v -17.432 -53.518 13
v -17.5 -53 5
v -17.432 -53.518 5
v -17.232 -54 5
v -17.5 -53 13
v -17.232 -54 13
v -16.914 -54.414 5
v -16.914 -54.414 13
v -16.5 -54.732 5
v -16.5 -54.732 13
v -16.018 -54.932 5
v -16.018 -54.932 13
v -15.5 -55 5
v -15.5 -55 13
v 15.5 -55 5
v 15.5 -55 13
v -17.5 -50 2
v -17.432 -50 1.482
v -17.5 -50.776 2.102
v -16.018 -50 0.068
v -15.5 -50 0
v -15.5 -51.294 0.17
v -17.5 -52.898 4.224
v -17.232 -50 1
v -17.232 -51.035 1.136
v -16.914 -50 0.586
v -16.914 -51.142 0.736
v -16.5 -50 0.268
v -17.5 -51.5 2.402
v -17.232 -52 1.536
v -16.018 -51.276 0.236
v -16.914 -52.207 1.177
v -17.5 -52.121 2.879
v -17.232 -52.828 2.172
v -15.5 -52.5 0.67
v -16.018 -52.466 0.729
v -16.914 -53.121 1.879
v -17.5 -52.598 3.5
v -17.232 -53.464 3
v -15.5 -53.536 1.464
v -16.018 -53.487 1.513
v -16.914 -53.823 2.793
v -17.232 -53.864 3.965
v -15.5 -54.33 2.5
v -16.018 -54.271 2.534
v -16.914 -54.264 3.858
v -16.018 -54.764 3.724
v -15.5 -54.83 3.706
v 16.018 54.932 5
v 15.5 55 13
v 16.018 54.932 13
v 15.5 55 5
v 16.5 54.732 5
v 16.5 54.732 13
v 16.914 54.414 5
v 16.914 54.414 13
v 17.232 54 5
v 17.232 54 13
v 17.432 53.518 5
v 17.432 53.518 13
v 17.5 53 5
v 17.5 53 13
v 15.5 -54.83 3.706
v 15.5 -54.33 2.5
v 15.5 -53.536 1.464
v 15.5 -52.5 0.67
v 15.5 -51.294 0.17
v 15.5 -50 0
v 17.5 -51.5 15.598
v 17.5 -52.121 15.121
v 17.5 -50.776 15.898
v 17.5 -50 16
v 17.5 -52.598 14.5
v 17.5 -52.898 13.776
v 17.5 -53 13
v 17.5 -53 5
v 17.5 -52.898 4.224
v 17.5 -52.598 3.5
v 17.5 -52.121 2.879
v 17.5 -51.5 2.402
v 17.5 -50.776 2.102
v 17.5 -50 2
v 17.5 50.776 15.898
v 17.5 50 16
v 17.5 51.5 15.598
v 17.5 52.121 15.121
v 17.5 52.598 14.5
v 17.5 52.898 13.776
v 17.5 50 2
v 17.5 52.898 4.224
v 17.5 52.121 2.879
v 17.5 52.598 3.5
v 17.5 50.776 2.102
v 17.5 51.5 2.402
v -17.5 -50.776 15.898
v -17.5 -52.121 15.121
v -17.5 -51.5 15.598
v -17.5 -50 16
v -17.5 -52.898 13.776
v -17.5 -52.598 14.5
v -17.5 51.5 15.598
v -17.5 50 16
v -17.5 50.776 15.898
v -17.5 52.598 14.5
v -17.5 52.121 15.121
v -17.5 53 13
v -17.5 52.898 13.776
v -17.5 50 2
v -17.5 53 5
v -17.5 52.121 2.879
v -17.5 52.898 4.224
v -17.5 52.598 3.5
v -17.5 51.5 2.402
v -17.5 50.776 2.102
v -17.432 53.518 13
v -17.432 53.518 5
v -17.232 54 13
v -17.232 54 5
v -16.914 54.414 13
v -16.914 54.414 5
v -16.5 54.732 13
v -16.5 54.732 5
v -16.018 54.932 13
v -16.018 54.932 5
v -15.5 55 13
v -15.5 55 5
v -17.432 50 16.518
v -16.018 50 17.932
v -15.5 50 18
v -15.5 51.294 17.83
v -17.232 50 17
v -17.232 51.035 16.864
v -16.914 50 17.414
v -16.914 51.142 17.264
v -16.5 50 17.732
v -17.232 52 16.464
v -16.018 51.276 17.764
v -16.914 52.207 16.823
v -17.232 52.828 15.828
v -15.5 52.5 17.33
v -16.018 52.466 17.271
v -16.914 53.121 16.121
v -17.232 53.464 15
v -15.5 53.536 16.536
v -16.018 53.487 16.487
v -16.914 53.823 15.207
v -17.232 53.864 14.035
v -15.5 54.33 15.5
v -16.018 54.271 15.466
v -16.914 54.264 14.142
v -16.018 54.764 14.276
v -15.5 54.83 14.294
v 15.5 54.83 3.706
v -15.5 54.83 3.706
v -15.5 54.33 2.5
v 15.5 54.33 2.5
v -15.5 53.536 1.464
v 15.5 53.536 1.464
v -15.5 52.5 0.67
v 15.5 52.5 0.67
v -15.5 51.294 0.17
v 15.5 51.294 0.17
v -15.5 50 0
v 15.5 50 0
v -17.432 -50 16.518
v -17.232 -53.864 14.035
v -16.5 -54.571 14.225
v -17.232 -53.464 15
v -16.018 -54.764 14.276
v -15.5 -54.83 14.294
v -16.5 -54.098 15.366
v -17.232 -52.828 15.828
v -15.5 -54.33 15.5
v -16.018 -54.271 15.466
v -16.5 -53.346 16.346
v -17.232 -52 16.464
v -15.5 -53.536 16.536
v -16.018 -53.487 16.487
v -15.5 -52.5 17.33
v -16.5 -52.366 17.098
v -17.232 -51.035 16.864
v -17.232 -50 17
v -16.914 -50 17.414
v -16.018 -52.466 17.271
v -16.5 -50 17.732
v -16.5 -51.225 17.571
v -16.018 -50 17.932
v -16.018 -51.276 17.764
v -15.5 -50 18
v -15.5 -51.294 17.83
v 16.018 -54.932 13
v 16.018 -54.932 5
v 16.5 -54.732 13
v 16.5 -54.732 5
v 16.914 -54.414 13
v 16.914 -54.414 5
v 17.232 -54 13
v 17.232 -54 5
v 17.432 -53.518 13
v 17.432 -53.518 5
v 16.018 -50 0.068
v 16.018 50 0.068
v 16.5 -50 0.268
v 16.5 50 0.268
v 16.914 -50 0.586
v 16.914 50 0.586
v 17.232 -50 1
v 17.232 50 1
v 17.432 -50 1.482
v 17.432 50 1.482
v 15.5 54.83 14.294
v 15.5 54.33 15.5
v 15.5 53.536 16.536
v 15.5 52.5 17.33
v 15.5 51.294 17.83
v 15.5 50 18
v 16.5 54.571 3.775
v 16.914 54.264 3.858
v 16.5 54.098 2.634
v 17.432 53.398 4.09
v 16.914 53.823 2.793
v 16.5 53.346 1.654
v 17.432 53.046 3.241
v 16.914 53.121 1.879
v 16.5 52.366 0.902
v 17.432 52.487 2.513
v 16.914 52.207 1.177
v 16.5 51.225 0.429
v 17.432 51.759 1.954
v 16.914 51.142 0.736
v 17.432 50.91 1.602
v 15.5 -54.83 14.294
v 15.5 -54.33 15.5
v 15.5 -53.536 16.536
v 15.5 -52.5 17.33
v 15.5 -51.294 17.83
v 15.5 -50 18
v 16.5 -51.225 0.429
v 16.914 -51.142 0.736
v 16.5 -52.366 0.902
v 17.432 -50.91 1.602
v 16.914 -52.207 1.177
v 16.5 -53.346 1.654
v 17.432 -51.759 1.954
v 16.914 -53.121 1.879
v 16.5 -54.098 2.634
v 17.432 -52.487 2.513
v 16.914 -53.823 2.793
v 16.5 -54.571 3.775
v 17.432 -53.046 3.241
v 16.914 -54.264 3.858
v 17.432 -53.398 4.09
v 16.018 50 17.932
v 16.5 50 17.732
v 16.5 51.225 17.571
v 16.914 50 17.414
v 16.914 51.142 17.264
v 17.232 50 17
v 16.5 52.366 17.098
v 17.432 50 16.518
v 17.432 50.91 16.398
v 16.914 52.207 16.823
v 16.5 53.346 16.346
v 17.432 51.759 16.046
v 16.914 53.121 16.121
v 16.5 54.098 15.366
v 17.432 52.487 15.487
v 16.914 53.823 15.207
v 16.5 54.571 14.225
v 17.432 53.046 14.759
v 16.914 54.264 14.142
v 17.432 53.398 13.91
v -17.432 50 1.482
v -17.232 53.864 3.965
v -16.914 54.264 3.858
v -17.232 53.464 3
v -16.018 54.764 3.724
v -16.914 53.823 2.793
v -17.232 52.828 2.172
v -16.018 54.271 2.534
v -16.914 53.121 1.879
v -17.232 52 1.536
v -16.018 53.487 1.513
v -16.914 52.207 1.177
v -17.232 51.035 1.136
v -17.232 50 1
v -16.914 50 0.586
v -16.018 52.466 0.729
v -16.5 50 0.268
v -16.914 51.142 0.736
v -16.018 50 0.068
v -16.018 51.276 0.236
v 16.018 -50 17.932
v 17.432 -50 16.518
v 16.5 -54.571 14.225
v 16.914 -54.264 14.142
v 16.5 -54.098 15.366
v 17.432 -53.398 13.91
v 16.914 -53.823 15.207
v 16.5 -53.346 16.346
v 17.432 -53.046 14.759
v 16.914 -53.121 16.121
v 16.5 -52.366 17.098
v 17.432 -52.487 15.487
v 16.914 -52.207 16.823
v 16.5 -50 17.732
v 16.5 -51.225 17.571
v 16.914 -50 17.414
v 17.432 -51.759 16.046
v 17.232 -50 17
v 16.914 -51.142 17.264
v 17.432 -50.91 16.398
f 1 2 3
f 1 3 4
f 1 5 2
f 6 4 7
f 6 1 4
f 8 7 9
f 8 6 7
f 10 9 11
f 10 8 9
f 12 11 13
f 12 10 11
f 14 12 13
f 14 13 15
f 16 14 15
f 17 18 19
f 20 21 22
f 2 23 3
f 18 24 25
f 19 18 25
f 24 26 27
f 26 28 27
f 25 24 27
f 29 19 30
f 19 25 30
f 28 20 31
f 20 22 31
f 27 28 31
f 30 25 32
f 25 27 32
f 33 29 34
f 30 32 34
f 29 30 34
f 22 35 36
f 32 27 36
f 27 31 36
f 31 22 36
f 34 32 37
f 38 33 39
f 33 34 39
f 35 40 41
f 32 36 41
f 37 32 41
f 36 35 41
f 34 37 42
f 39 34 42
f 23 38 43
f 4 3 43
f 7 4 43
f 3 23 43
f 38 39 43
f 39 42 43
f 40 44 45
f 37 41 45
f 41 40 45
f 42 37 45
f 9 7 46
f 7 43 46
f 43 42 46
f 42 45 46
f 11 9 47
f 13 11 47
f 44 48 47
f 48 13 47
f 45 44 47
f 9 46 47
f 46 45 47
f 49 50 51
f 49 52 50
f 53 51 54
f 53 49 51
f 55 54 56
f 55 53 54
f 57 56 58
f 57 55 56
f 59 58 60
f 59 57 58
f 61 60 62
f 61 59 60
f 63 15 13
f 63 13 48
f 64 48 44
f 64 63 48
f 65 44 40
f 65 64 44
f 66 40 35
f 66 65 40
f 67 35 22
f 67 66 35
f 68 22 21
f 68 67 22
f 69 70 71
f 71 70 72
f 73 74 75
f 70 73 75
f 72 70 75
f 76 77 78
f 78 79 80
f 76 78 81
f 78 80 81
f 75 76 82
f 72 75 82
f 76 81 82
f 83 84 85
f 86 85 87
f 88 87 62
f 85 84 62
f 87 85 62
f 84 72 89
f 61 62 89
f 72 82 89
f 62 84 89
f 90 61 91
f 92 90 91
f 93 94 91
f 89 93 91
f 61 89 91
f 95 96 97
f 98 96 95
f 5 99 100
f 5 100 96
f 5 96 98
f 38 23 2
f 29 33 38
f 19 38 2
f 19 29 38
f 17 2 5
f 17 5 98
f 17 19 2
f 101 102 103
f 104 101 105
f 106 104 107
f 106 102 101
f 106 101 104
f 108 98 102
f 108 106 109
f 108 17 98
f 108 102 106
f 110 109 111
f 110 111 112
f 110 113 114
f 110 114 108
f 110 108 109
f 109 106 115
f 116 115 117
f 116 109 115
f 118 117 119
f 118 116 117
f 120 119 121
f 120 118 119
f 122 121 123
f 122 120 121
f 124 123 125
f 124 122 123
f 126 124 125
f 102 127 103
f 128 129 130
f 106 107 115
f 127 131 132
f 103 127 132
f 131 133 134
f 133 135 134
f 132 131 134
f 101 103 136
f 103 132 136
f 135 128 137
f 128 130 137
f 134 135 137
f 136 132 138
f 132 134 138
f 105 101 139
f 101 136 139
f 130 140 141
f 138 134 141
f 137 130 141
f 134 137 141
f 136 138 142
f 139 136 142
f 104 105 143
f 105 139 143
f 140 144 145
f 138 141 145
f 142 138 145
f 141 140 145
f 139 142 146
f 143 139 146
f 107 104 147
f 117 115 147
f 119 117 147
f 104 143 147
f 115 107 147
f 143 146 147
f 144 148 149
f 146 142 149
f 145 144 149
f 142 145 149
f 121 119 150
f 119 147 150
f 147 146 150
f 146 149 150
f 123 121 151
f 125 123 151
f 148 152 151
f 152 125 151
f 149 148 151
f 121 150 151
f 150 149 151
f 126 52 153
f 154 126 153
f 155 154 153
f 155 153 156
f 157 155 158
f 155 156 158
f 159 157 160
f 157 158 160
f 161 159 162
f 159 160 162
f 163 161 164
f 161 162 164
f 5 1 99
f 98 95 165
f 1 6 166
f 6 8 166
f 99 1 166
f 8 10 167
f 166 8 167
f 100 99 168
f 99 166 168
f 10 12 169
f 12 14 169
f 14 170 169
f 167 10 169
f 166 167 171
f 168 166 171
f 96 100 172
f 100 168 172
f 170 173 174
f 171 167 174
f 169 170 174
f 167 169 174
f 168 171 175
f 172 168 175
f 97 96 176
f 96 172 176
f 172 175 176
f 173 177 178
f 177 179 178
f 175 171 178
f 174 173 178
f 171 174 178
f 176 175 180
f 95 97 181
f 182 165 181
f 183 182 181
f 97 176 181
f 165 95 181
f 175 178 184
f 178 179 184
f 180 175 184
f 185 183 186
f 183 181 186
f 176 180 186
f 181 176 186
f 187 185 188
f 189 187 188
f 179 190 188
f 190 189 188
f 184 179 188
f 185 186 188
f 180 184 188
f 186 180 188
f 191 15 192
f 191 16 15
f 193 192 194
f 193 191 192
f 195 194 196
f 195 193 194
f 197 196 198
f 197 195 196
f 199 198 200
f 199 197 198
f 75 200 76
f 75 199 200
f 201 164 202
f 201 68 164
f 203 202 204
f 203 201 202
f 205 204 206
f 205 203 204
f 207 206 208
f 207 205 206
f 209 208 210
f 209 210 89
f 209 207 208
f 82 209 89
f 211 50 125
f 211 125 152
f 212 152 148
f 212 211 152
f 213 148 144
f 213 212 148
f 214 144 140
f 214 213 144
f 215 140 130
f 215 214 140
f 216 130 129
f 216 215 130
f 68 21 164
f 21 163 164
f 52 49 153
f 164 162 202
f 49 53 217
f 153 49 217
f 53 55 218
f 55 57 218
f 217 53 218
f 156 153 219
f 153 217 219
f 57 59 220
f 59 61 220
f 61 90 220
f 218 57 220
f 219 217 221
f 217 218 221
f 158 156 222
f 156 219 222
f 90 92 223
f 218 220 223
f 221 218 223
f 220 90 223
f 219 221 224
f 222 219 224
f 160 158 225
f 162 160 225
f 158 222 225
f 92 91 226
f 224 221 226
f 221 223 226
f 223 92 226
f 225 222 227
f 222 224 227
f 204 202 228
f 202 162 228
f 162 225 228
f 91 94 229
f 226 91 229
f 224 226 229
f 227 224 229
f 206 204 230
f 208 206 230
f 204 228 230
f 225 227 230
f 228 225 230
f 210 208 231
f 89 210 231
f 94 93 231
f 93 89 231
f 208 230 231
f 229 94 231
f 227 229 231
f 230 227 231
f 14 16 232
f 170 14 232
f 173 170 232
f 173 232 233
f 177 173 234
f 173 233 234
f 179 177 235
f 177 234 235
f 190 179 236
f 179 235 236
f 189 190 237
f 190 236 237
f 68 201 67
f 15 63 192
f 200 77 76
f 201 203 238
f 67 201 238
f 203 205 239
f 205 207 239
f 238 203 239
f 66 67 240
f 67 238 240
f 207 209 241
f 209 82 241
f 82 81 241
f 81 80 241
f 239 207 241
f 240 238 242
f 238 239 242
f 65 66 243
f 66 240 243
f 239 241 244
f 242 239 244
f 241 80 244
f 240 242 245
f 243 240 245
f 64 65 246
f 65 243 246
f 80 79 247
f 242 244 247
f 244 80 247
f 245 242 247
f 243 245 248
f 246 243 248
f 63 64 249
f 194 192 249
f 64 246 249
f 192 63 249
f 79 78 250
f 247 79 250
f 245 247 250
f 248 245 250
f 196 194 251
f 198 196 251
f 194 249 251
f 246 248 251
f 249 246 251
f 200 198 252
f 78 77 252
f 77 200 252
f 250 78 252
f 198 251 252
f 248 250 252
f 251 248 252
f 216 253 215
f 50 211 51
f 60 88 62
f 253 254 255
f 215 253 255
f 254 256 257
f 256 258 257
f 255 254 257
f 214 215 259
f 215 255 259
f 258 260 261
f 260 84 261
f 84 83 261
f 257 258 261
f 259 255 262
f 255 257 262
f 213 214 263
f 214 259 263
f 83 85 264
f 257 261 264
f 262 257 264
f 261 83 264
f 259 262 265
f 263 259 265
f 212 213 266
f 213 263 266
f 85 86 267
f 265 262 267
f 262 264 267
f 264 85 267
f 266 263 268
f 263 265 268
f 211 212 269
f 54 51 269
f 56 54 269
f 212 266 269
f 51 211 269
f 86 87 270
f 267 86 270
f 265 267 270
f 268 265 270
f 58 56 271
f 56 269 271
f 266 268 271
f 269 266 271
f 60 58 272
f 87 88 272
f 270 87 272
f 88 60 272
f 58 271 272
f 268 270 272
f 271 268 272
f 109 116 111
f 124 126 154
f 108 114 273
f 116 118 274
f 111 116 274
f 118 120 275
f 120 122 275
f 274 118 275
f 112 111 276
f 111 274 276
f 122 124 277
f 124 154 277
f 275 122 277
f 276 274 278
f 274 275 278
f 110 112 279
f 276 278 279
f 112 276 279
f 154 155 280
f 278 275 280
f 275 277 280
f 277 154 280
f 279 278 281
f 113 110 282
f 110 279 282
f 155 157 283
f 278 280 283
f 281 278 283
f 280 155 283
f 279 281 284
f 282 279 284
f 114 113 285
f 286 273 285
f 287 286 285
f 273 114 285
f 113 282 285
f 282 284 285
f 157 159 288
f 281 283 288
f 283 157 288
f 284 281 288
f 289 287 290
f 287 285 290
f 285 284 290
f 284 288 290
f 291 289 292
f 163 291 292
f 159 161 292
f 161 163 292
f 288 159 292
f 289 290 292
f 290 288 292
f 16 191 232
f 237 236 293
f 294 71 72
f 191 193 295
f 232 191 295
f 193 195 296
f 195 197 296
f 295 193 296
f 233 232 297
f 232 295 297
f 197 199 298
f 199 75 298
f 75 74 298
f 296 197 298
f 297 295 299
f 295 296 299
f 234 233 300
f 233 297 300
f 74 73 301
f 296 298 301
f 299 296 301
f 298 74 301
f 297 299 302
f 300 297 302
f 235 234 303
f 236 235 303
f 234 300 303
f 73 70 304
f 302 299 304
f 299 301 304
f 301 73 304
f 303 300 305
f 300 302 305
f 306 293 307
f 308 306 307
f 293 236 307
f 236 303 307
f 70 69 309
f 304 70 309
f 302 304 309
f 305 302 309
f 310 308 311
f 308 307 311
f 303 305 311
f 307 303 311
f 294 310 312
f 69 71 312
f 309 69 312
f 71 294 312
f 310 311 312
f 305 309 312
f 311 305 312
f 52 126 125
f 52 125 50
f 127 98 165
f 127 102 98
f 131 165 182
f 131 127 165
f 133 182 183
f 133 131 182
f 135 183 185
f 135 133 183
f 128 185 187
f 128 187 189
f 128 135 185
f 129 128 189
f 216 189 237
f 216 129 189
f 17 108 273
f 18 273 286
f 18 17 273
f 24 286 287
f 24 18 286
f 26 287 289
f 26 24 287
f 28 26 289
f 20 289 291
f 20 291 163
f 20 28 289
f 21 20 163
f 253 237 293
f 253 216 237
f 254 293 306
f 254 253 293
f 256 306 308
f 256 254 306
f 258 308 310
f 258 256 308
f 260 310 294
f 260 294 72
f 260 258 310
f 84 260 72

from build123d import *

# Parameters (mm, degrees)
F0_W     = 35
F0_H     = 110
F1_DEPTH = 18
F2_R     = 5
F3_R     = 2


with BuildPart() as f1:
    # F0 (on Top) → F1 (new body)
    with BuildSketch(Plane.XY):
        Rectangle(F0_W, F0_H)
    extrude(amount=F1_DEPTH)

    # F2
    f2_edges = [f1.edges().sort_by_distance(p)[0] for p in [
        (0, 55, 0),
        (0, 55, 18),
        (0, -55, 18),
        (0, -55, 0),
    ]]
    fillet(f2_edges, radius=F2_R)

    # F3
    f3_edges = [f1.edges().sort_by_distance(p)[0] for p in [
        (-17.5, 0, 18),
        (-17.5, 53.535534, 16.535534),
        (17.5, 0, 18),
    ]]
    fillet(f3_edges, radius=F3_R)


solid = f1.part
